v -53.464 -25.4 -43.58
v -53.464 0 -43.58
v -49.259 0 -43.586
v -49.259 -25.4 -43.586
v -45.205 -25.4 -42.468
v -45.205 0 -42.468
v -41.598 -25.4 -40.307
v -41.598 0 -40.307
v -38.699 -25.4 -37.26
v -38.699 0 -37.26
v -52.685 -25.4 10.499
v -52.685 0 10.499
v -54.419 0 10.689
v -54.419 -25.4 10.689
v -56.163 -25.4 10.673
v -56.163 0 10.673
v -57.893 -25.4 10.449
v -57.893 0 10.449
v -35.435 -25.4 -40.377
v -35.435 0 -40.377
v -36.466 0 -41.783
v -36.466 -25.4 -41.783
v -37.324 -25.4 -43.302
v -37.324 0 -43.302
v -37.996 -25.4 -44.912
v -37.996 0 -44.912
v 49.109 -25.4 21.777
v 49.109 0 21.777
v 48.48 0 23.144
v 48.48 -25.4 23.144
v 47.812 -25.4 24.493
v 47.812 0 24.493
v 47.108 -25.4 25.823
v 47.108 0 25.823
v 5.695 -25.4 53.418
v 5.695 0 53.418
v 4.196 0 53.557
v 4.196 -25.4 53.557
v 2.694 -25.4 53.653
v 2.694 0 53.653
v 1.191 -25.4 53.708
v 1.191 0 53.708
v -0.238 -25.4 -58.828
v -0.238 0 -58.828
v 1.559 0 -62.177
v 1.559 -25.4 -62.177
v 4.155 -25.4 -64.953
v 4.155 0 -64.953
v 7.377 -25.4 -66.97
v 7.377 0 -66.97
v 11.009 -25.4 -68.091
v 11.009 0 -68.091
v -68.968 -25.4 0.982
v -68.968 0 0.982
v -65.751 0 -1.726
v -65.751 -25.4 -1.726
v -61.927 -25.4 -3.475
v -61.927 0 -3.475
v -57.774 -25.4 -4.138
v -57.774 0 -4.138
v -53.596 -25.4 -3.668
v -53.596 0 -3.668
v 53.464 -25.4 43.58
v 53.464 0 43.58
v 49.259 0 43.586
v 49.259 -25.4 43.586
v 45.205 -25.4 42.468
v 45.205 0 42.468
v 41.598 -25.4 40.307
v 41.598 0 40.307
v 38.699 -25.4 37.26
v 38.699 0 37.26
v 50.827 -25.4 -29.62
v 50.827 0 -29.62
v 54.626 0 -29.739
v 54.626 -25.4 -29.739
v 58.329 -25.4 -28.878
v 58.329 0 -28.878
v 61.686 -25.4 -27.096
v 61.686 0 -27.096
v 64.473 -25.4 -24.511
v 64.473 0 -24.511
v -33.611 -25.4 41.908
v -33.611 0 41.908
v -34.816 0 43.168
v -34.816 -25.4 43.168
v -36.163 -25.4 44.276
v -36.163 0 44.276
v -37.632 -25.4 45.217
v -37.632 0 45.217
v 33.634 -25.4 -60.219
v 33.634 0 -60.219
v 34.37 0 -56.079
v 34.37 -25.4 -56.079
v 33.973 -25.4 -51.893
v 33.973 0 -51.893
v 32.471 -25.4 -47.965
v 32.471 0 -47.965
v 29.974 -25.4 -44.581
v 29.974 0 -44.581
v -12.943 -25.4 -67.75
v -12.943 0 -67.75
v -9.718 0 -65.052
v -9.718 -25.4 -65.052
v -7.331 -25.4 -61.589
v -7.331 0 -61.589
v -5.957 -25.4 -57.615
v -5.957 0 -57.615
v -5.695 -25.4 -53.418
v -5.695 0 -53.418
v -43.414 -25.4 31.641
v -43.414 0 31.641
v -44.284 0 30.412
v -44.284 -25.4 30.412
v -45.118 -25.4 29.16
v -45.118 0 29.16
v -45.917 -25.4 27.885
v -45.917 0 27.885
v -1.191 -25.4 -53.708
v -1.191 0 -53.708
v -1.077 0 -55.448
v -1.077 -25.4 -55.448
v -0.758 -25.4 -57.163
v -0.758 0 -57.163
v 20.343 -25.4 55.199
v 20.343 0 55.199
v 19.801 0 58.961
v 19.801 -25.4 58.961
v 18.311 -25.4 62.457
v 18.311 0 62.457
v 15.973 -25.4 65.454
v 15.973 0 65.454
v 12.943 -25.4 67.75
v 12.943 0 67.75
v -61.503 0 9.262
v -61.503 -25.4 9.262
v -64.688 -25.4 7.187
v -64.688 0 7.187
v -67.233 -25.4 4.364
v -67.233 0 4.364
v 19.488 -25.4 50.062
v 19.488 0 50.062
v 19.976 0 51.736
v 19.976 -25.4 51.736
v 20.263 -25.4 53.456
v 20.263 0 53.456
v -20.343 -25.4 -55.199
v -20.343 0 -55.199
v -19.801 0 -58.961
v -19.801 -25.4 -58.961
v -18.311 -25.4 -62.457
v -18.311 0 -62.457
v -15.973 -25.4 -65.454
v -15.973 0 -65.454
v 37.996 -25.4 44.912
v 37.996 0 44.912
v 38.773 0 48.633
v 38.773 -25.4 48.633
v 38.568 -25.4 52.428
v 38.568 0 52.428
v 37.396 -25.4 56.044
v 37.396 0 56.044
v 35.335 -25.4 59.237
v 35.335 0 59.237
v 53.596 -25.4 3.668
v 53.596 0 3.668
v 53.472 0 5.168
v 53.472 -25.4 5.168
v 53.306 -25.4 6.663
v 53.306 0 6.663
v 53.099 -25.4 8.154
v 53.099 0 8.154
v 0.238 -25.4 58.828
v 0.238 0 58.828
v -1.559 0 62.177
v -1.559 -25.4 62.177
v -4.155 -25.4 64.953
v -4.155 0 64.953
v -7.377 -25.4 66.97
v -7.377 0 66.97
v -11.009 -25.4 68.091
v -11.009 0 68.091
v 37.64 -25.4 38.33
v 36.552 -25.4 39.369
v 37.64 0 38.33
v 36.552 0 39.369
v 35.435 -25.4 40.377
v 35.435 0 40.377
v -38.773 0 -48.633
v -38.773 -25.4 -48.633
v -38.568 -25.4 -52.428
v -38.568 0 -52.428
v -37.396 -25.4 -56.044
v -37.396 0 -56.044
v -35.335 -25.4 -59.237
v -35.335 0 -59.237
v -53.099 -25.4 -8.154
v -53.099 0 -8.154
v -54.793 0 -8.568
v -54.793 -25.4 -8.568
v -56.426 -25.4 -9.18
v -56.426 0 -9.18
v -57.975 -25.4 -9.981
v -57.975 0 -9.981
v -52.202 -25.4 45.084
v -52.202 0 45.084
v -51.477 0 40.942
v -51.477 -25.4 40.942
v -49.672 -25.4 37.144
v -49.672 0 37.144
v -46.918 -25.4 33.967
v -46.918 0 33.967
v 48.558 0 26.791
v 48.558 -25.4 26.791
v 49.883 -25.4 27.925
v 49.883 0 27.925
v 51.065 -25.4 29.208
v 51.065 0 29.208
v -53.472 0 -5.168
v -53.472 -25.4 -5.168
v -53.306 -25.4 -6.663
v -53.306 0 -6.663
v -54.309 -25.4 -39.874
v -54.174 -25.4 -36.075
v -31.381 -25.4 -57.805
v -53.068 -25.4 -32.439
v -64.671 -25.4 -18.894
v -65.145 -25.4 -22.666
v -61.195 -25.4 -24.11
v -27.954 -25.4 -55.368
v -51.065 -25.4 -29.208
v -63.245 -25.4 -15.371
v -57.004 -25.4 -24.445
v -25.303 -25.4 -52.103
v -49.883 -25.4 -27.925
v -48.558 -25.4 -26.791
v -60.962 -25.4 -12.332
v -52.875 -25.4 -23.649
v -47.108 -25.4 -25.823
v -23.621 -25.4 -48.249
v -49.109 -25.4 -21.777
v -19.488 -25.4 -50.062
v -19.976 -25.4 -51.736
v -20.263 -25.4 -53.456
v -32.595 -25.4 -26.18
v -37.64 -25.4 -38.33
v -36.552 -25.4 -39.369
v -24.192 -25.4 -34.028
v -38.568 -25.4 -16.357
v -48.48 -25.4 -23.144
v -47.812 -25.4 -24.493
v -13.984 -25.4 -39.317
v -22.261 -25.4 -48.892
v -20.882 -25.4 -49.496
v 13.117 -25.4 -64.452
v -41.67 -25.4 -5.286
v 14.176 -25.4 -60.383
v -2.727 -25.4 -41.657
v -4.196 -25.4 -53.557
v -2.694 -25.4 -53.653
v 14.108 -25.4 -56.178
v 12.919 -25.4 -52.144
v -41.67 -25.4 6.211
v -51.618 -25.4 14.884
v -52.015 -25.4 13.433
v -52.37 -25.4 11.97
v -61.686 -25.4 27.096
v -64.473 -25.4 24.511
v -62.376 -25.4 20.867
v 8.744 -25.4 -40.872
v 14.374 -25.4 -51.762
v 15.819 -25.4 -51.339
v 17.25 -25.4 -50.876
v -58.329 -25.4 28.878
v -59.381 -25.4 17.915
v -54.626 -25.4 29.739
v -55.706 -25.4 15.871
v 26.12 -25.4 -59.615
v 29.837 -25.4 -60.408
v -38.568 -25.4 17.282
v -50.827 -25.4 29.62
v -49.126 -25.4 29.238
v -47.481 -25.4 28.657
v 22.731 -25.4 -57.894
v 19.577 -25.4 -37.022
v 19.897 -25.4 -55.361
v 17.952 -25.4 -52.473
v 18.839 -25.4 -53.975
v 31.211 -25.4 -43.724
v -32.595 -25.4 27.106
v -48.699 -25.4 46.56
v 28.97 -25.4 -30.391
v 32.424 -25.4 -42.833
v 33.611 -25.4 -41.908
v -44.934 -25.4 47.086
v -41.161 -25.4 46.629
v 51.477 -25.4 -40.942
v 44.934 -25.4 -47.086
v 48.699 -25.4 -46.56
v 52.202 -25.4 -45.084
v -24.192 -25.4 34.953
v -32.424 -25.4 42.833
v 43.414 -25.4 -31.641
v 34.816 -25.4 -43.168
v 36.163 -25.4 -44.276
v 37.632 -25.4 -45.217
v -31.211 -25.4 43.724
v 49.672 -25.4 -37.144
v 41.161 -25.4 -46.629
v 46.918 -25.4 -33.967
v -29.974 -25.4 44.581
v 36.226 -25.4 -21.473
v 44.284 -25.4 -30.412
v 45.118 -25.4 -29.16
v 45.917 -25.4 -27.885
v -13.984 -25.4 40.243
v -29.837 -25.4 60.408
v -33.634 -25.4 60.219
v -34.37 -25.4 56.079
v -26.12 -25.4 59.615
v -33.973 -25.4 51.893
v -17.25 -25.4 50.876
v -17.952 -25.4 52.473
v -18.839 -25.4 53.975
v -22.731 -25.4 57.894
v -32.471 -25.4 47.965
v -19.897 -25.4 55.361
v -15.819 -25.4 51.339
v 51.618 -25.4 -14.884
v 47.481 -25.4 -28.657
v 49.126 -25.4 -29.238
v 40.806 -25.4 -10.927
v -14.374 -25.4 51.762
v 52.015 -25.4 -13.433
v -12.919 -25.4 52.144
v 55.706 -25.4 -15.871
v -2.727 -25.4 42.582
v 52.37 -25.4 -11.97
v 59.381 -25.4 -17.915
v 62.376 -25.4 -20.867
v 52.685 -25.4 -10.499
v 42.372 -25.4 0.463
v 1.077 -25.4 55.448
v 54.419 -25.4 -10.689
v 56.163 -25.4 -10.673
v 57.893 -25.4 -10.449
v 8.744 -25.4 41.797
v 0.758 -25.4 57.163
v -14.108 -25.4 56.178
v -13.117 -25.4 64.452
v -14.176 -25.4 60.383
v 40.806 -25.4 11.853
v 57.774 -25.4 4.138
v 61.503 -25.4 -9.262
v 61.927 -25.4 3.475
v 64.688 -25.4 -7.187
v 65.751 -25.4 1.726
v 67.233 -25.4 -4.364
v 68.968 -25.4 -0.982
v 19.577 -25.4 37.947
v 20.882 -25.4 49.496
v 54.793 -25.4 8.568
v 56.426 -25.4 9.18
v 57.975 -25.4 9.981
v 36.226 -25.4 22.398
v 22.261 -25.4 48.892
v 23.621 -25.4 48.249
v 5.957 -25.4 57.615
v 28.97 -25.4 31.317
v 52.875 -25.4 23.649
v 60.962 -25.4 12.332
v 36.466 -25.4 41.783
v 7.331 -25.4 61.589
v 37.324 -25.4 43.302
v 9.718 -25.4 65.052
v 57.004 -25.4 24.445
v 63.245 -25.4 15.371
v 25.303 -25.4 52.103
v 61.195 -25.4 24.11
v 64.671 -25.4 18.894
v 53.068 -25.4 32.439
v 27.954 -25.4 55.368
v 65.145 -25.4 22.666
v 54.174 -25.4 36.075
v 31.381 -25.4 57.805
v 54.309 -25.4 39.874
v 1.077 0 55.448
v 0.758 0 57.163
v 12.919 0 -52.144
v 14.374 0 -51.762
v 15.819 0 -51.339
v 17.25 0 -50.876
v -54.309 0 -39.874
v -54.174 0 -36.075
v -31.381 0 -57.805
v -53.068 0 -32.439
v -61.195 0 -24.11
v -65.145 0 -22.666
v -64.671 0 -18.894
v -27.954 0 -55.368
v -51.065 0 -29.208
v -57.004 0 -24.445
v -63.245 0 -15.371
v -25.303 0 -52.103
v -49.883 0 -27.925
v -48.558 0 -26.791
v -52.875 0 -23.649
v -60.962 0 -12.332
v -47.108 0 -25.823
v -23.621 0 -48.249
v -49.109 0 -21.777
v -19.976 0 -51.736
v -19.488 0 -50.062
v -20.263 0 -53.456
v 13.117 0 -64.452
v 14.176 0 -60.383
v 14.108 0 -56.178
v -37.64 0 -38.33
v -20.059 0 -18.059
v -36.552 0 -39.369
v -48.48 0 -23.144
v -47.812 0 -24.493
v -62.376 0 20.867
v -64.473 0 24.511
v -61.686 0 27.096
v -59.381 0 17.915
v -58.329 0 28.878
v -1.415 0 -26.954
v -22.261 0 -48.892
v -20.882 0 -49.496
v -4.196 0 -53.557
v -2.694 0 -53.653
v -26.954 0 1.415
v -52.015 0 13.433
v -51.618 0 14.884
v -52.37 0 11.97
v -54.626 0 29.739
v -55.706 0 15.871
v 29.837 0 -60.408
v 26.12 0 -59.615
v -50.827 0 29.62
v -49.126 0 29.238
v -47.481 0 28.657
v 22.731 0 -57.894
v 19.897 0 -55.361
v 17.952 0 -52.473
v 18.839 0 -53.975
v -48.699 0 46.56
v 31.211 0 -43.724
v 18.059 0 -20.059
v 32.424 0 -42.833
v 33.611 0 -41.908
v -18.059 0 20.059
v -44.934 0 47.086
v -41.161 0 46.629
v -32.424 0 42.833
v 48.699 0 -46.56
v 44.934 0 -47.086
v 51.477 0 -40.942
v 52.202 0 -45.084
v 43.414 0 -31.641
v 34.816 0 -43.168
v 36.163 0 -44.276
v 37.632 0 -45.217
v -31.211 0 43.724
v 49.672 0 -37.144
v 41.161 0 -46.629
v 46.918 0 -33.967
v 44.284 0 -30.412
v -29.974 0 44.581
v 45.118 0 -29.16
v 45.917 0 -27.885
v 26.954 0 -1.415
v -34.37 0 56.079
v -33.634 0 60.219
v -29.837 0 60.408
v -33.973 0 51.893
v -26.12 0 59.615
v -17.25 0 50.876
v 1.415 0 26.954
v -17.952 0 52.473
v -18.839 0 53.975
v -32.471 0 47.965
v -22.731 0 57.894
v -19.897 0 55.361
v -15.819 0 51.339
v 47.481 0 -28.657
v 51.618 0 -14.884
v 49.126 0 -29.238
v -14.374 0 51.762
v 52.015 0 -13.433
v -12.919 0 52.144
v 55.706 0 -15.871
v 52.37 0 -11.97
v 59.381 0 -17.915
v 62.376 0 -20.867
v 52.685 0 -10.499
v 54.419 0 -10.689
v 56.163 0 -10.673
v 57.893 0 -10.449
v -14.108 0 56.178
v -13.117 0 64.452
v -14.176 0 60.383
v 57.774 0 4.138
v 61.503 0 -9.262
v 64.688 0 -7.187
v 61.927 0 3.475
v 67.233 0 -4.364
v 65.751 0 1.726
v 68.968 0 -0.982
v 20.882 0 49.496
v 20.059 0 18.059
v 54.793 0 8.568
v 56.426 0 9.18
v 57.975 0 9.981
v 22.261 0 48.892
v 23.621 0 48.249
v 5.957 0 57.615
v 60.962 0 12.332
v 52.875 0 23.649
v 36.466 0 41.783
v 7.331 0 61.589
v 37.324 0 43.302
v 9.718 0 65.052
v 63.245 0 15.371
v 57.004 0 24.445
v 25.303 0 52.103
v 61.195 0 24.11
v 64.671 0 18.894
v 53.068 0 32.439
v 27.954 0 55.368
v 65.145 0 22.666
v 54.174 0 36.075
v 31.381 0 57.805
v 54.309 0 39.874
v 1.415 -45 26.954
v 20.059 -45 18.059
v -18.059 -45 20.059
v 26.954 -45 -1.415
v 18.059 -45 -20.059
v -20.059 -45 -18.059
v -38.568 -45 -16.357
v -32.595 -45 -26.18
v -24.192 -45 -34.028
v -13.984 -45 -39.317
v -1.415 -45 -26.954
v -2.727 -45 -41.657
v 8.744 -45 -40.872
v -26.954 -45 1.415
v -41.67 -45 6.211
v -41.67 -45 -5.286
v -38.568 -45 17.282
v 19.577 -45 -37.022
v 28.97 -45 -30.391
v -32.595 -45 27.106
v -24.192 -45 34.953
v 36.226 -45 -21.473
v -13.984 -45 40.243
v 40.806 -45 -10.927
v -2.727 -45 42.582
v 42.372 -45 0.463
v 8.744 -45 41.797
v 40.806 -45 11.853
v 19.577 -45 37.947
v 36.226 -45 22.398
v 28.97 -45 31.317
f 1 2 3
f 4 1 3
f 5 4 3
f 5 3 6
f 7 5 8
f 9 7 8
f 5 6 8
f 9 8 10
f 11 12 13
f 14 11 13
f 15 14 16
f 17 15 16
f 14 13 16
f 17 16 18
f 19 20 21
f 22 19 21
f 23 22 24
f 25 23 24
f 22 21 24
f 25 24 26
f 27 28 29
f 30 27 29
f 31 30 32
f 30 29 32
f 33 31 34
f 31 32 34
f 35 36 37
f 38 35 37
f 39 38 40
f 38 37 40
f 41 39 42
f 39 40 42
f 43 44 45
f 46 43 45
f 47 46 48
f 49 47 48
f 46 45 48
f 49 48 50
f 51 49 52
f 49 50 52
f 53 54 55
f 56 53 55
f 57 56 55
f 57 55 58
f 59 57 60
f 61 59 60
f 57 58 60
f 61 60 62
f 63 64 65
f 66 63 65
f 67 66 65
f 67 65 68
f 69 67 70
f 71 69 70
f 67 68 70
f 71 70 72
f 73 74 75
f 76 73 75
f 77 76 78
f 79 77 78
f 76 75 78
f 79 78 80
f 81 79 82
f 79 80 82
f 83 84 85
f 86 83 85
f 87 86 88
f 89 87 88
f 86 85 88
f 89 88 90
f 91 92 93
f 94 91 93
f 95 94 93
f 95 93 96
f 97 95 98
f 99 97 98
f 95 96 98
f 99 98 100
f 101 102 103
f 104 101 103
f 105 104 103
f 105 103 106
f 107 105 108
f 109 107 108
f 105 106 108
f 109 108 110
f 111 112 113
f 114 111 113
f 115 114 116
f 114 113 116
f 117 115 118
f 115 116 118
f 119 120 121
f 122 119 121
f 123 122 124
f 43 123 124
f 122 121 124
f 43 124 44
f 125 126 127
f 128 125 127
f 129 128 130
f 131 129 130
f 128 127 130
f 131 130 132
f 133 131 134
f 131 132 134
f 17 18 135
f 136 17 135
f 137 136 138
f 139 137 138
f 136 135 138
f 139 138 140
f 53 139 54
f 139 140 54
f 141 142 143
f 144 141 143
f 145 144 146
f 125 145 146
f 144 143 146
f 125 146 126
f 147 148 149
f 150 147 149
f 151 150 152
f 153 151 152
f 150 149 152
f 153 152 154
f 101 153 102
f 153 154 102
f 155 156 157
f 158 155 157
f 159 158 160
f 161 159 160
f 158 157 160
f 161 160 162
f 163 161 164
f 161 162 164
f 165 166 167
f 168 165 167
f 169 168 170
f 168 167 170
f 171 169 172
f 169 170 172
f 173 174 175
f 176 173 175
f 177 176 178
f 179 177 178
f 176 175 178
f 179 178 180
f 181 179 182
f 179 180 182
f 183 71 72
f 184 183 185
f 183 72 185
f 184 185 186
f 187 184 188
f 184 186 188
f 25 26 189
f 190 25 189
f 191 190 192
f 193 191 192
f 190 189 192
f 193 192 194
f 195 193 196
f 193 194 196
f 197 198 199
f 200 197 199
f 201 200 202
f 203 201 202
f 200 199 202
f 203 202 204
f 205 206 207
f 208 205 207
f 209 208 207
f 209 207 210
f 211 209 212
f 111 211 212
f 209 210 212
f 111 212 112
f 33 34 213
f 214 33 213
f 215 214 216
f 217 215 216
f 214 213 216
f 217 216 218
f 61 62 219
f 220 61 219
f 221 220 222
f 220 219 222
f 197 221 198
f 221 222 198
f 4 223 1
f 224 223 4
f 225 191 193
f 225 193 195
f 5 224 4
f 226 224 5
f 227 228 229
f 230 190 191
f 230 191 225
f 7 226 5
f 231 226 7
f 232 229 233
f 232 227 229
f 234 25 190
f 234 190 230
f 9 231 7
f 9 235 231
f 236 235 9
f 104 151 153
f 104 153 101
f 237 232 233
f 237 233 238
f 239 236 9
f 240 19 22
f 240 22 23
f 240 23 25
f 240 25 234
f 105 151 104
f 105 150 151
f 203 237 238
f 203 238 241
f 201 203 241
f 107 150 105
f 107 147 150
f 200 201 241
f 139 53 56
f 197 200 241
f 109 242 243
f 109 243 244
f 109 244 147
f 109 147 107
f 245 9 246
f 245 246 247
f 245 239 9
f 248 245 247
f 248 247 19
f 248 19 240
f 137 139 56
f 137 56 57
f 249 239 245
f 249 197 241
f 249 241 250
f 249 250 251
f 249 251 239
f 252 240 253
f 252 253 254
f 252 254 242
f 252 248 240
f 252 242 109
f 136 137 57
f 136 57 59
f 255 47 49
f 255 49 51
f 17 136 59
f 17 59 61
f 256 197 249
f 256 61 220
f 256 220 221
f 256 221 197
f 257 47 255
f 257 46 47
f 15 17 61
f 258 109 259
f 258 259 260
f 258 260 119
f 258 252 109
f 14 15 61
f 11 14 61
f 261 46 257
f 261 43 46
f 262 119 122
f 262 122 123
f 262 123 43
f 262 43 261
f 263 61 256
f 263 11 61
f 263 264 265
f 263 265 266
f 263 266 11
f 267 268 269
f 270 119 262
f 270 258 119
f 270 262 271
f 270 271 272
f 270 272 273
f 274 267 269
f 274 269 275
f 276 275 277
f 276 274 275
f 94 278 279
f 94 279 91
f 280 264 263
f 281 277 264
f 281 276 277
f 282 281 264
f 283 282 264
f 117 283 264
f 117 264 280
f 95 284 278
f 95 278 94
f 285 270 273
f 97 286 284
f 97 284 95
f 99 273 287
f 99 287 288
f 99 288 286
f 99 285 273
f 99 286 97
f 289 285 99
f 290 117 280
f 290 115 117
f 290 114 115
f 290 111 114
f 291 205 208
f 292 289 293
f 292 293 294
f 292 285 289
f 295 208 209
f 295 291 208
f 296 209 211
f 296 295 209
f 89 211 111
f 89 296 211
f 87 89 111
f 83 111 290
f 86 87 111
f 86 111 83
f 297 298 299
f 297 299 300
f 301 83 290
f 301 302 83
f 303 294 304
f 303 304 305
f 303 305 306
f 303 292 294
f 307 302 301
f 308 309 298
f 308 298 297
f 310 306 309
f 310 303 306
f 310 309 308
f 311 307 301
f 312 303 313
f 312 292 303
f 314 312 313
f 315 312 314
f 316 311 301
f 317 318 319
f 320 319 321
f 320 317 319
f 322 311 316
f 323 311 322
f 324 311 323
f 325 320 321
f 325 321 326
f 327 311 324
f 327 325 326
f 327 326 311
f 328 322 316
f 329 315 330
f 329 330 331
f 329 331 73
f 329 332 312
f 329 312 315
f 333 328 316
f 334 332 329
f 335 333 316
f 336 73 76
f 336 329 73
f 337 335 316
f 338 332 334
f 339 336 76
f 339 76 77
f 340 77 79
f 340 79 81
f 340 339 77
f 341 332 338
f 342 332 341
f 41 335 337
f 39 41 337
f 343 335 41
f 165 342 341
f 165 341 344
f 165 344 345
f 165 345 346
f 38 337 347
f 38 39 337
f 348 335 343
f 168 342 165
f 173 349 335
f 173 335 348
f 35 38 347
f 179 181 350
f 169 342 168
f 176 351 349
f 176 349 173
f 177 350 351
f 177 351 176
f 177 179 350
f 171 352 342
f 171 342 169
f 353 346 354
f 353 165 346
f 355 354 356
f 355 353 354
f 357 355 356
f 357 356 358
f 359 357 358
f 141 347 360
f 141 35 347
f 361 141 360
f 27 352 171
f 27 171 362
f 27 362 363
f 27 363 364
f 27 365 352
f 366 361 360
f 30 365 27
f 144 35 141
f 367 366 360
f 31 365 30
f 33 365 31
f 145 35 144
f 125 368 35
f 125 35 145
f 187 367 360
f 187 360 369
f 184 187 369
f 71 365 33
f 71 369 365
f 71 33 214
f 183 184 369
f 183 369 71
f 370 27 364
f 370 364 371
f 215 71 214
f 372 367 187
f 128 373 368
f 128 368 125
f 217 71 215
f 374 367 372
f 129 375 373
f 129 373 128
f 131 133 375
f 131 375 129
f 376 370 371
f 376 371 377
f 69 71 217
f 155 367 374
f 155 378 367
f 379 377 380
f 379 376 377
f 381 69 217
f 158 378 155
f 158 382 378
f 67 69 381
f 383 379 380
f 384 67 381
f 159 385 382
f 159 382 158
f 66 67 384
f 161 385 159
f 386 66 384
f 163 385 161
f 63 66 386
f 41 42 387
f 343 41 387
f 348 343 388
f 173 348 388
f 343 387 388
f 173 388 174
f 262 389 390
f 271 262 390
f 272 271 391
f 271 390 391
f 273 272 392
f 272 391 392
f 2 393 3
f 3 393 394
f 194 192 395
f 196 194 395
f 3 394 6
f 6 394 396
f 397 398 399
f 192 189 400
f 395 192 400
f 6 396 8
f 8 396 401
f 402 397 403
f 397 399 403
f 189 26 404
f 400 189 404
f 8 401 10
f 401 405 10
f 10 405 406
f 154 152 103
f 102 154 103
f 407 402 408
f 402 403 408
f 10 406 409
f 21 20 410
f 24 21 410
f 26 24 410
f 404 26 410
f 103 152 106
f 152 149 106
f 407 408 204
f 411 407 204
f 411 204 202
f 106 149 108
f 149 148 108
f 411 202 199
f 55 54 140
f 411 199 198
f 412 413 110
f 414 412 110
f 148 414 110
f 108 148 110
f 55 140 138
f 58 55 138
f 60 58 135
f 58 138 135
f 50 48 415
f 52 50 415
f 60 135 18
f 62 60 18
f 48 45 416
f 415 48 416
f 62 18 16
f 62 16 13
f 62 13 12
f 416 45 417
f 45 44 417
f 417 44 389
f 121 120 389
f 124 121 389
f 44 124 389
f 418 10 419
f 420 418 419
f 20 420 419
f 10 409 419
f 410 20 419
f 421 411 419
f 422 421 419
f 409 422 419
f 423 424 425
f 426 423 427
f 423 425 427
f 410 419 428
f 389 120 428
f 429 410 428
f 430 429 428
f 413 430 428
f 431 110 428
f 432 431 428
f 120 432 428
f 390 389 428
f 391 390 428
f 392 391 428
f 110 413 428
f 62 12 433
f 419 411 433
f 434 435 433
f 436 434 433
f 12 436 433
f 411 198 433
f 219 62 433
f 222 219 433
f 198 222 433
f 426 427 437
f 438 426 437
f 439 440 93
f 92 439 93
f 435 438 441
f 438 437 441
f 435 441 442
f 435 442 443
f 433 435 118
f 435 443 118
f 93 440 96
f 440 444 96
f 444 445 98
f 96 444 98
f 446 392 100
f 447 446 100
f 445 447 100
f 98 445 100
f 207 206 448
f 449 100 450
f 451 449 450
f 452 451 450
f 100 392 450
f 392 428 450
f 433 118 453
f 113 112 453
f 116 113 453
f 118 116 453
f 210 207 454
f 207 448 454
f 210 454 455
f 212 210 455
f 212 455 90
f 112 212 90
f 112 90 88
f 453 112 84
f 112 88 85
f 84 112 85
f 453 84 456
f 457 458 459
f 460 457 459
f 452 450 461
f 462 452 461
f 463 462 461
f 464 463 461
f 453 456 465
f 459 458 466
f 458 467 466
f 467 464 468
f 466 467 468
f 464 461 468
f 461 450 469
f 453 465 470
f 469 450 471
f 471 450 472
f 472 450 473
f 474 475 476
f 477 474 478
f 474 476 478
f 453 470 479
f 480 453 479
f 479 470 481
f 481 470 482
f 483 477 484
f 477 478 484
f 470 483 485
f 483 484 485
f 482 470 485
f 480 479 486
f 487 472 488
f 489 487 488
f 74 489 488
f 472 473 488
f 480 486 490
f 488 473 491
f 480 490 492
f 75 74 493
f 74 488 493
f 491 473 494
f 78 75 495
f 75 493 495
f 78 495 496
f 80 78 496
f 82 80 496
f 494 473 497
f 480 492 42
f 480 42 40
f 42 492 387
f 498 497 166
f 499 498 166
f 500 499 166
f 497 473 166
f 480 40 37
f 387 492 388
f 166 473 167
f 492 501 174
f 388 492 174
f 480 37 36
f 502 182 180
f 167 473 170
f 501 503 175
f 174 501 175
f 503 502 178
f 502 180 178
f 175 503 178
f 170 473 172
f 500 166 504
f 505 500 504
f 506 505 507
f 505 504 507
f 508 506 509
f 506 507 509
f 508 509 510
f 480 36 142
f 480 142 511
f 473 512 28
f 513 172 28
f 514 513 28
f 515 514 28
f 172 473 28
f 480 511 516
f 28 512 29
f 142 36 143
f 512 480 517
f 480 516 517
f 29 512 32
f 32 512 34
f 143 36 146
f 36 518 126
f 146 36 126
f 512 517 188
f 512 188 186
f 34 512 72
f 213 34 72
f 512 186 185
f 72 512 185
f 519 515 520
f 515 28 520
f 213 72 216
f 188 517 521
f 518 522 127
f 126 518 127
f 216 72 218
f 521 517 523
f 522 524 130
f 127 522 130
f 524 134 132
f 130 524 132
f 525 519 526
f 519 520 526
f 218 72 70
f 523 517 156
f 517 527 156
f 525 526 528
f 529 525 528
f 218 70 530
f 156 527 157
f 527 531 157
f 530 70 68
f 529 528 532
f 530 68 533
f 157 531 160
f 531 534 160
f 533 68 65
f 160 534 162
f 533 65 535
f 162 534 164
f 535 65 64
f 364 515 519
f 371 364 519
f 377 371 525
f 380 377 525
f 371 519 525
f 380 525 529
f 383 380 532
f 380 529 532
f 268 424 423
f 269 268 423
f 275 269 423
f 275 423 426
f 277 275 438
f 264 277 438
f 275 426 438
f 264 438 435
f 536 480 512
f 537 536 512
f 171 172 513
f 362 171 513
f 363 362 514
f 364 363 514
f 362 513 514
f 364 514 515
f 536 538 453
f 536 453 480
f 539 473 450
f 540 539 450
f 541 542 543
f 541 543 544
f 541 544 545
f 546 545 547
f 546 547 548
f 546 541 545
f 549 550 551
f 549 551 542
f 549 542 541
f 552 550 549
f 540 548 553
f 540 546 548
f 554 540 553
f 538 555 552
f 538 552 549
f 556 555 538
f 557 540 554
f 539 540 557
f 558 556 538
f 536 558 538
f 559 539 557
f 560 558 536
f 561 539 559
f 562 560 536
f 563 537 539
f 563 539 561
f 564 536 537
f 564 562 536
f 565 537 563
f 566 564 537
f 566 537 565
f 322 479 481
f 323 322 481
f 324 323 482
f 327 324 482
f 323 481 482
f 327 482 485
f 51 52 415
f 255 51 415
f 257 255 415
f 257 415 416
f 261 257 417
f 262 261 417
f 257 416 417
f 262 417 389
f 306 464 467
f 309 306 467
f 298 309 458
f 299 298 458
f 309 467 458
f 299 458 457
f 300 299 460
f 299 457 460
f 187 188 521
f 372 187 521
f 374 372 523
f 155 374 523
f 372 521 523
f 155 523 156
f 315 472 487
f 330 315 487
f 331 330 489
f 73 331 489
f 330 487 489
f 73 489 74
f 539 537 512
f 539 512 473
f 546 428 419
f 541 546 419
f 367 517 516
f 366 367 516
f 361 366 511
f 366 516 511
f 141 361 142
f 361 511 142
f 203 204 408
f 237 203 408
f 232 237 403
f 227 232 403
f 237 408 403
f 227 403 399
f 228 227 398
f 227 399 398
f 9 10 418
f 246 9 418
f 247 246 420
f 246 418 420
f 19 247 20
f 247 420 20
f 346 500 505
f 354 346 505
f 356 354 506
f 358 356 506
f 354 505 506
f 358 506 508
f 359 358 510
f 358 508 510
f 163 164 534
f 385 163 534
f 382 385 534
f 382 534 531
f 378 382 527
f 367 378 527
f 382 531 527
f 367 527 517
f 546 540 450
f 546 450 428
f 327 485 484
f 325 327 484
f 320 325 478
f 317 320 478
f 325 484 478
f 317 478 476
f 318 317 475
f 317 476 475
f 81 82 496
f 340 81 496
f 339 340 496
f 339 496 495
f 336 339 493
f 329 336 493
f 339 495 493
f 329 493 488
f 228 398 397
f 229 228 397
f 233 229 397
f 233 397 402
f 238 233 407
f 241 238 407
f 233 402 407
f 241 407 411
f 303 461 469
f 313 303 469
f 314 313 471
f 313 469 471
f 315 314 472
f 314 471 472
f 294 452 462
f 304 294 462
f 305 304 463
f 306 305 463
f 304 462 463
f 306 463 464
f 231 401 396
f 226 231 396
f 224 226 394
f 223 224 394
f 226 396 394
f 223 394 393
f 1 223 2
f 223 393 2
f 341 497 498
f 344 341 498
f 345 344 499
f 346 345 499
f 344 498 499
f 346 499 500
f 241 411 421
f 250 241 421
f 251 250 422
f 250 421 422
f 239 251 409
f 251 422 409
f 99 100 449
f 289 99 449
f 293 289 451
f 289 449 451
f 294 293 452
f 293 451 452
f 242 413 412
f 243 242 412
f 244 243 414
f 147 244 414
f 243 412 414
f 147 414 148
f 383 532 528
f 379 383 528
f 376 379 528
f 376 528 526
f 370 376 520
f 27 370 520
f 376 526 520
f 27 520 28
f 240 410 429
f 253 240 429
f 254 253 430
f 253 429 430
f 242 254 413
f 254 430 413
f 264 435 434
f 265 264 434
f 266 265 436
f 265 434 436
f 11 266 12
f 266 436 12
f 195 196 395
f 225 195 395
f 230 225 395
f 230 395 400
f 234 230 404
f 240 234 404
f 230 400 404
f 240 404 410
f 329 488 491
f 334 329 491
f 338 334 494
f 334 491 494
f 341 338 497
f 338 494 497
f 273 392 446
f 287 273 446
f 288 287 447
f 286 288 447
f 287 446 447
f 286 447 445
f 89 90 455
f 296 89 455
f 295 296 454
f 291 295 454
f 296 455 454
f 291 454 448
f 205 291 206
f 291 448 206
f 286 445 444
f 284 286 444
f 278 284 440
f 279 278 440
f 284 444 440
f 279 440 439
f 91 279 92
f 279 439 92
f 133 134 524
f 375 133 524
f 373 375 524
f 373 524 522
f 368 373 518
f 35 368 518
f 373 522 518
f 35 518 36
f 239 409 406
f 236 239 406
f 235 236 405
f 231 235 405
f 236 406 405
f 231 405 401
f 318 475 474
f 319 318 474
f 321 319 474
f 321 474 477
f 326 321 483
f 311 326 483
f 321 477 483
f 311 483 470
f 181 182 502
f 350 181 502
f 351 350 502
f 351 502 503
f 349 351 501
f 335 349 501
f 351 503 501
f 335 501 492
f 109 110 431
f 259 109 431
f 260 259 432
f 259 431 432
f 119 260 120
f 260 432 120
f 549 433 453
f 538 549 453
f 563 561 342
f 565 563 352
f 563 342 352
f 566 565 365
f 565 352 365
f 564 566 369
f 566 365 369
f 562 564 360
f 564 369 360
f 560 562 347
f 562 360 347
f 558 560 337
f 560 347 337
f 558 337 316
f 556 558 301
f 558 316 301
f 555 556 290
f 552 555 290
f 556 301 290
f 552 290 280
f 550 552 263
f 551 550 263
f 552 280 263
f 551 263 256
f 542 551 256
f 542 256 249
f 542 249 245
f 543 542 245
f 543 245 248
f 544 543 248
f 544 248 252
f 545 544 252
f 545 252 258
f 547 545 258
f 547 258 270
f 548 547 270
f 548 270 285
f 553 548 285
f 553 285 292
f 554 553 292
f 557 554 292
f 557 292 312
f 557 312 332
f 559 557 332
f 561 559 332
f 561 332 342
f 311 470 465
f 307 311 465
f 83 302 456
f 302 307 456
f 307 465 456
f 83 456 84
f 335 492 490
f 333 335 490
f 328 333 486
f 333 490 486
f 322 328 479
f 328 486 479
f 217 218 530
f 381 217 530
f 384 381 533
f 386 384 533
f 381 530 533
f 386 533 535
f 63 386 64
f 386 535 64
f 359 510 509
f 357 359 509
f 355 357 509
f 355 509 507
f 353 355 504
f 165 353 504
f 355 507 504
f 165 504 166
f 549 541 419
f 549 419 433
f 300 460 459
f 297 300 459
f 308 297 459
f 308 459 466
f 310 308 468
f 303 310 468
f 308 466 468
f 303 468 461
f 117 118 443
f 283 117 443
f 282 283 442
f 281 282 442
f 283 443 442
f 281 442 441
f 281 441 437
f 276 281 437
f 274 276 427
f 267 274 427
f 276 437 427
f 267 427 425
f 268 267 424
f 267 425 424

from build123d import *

# Parameters (mm, degrees)
F0_R     = 42.21774
F1_DEPTH = 25.4
F2_COUNT = 18
F3_DEPTH = 45


with BuildPart() as f1:
    # F0 (on Front) → F1 (new body)
    with BuildSketch(Plane.XZ):
        with BuildLine():
            ThreePointArc((-12.918881, 52.144495), (-33.105367, -42.308161), (53.721, 0))
            ThreePointArc((53.721, 0), (38.40509, 37.563212), (1.190523, 53.707807))
            ThreePointArc((1.190523, 53.707807), (-5.916044, 53.394253), (-12.918881, 52.144495))
        make_face()
        with Locations((0.154254, 0.462766)):
            Circle(F0_R, mode=Mode.SUBTRACT)
        with BuildLine():
            ThreePointArc((-12.918881, 52.144495), (-5.916044, 53.394253), (1.190523, 53.707807))
            ThreePointArc((1.190523, 53.707807), (0.942954, 56.310266), (0.237615, 58.827522))
            ThreePointArc((0.237615, 58.827522), (-4.155035, 64.953488), (-11.009105, 68.091091))
            ThreePointArc((-11.009105, 68.091091), (-14.1755, 60.382645), (-12.918881, 52.144495))
        make_face()
    extrude(amount=F1_DEPTH)

    # F2: F1 ×18 about axis
    f2_axis = Axis((0, 0, 0), (0, 1, 0))


with BuildPart() as f1_1:
    add(f1.part)
    for i in range(1, F2_COUNT):
        add(f1.part.rotate(f2_axis, i * 360 / F2_COUNT))

    # F0 (on Front) → F3 (join)
    with BuildSketch(Plane.XZ):
        with Locations((0.154254, 0.462766)):
            Circle(F0_R)
        Polygon((-26.953759, 1.414539), (-18.058955, 20.059416), (1.414539, 26.953759), (20.059416, 18.058955), (26.953759, -1.414539), (18.058955, -20.059416), (-1.414539, -26.953759), (-20.059416, -18.058955), align=None, mode=Mode.SUBTRACT)
    extrude(amount=F3_DEPTH)


solid = f1_1.part
